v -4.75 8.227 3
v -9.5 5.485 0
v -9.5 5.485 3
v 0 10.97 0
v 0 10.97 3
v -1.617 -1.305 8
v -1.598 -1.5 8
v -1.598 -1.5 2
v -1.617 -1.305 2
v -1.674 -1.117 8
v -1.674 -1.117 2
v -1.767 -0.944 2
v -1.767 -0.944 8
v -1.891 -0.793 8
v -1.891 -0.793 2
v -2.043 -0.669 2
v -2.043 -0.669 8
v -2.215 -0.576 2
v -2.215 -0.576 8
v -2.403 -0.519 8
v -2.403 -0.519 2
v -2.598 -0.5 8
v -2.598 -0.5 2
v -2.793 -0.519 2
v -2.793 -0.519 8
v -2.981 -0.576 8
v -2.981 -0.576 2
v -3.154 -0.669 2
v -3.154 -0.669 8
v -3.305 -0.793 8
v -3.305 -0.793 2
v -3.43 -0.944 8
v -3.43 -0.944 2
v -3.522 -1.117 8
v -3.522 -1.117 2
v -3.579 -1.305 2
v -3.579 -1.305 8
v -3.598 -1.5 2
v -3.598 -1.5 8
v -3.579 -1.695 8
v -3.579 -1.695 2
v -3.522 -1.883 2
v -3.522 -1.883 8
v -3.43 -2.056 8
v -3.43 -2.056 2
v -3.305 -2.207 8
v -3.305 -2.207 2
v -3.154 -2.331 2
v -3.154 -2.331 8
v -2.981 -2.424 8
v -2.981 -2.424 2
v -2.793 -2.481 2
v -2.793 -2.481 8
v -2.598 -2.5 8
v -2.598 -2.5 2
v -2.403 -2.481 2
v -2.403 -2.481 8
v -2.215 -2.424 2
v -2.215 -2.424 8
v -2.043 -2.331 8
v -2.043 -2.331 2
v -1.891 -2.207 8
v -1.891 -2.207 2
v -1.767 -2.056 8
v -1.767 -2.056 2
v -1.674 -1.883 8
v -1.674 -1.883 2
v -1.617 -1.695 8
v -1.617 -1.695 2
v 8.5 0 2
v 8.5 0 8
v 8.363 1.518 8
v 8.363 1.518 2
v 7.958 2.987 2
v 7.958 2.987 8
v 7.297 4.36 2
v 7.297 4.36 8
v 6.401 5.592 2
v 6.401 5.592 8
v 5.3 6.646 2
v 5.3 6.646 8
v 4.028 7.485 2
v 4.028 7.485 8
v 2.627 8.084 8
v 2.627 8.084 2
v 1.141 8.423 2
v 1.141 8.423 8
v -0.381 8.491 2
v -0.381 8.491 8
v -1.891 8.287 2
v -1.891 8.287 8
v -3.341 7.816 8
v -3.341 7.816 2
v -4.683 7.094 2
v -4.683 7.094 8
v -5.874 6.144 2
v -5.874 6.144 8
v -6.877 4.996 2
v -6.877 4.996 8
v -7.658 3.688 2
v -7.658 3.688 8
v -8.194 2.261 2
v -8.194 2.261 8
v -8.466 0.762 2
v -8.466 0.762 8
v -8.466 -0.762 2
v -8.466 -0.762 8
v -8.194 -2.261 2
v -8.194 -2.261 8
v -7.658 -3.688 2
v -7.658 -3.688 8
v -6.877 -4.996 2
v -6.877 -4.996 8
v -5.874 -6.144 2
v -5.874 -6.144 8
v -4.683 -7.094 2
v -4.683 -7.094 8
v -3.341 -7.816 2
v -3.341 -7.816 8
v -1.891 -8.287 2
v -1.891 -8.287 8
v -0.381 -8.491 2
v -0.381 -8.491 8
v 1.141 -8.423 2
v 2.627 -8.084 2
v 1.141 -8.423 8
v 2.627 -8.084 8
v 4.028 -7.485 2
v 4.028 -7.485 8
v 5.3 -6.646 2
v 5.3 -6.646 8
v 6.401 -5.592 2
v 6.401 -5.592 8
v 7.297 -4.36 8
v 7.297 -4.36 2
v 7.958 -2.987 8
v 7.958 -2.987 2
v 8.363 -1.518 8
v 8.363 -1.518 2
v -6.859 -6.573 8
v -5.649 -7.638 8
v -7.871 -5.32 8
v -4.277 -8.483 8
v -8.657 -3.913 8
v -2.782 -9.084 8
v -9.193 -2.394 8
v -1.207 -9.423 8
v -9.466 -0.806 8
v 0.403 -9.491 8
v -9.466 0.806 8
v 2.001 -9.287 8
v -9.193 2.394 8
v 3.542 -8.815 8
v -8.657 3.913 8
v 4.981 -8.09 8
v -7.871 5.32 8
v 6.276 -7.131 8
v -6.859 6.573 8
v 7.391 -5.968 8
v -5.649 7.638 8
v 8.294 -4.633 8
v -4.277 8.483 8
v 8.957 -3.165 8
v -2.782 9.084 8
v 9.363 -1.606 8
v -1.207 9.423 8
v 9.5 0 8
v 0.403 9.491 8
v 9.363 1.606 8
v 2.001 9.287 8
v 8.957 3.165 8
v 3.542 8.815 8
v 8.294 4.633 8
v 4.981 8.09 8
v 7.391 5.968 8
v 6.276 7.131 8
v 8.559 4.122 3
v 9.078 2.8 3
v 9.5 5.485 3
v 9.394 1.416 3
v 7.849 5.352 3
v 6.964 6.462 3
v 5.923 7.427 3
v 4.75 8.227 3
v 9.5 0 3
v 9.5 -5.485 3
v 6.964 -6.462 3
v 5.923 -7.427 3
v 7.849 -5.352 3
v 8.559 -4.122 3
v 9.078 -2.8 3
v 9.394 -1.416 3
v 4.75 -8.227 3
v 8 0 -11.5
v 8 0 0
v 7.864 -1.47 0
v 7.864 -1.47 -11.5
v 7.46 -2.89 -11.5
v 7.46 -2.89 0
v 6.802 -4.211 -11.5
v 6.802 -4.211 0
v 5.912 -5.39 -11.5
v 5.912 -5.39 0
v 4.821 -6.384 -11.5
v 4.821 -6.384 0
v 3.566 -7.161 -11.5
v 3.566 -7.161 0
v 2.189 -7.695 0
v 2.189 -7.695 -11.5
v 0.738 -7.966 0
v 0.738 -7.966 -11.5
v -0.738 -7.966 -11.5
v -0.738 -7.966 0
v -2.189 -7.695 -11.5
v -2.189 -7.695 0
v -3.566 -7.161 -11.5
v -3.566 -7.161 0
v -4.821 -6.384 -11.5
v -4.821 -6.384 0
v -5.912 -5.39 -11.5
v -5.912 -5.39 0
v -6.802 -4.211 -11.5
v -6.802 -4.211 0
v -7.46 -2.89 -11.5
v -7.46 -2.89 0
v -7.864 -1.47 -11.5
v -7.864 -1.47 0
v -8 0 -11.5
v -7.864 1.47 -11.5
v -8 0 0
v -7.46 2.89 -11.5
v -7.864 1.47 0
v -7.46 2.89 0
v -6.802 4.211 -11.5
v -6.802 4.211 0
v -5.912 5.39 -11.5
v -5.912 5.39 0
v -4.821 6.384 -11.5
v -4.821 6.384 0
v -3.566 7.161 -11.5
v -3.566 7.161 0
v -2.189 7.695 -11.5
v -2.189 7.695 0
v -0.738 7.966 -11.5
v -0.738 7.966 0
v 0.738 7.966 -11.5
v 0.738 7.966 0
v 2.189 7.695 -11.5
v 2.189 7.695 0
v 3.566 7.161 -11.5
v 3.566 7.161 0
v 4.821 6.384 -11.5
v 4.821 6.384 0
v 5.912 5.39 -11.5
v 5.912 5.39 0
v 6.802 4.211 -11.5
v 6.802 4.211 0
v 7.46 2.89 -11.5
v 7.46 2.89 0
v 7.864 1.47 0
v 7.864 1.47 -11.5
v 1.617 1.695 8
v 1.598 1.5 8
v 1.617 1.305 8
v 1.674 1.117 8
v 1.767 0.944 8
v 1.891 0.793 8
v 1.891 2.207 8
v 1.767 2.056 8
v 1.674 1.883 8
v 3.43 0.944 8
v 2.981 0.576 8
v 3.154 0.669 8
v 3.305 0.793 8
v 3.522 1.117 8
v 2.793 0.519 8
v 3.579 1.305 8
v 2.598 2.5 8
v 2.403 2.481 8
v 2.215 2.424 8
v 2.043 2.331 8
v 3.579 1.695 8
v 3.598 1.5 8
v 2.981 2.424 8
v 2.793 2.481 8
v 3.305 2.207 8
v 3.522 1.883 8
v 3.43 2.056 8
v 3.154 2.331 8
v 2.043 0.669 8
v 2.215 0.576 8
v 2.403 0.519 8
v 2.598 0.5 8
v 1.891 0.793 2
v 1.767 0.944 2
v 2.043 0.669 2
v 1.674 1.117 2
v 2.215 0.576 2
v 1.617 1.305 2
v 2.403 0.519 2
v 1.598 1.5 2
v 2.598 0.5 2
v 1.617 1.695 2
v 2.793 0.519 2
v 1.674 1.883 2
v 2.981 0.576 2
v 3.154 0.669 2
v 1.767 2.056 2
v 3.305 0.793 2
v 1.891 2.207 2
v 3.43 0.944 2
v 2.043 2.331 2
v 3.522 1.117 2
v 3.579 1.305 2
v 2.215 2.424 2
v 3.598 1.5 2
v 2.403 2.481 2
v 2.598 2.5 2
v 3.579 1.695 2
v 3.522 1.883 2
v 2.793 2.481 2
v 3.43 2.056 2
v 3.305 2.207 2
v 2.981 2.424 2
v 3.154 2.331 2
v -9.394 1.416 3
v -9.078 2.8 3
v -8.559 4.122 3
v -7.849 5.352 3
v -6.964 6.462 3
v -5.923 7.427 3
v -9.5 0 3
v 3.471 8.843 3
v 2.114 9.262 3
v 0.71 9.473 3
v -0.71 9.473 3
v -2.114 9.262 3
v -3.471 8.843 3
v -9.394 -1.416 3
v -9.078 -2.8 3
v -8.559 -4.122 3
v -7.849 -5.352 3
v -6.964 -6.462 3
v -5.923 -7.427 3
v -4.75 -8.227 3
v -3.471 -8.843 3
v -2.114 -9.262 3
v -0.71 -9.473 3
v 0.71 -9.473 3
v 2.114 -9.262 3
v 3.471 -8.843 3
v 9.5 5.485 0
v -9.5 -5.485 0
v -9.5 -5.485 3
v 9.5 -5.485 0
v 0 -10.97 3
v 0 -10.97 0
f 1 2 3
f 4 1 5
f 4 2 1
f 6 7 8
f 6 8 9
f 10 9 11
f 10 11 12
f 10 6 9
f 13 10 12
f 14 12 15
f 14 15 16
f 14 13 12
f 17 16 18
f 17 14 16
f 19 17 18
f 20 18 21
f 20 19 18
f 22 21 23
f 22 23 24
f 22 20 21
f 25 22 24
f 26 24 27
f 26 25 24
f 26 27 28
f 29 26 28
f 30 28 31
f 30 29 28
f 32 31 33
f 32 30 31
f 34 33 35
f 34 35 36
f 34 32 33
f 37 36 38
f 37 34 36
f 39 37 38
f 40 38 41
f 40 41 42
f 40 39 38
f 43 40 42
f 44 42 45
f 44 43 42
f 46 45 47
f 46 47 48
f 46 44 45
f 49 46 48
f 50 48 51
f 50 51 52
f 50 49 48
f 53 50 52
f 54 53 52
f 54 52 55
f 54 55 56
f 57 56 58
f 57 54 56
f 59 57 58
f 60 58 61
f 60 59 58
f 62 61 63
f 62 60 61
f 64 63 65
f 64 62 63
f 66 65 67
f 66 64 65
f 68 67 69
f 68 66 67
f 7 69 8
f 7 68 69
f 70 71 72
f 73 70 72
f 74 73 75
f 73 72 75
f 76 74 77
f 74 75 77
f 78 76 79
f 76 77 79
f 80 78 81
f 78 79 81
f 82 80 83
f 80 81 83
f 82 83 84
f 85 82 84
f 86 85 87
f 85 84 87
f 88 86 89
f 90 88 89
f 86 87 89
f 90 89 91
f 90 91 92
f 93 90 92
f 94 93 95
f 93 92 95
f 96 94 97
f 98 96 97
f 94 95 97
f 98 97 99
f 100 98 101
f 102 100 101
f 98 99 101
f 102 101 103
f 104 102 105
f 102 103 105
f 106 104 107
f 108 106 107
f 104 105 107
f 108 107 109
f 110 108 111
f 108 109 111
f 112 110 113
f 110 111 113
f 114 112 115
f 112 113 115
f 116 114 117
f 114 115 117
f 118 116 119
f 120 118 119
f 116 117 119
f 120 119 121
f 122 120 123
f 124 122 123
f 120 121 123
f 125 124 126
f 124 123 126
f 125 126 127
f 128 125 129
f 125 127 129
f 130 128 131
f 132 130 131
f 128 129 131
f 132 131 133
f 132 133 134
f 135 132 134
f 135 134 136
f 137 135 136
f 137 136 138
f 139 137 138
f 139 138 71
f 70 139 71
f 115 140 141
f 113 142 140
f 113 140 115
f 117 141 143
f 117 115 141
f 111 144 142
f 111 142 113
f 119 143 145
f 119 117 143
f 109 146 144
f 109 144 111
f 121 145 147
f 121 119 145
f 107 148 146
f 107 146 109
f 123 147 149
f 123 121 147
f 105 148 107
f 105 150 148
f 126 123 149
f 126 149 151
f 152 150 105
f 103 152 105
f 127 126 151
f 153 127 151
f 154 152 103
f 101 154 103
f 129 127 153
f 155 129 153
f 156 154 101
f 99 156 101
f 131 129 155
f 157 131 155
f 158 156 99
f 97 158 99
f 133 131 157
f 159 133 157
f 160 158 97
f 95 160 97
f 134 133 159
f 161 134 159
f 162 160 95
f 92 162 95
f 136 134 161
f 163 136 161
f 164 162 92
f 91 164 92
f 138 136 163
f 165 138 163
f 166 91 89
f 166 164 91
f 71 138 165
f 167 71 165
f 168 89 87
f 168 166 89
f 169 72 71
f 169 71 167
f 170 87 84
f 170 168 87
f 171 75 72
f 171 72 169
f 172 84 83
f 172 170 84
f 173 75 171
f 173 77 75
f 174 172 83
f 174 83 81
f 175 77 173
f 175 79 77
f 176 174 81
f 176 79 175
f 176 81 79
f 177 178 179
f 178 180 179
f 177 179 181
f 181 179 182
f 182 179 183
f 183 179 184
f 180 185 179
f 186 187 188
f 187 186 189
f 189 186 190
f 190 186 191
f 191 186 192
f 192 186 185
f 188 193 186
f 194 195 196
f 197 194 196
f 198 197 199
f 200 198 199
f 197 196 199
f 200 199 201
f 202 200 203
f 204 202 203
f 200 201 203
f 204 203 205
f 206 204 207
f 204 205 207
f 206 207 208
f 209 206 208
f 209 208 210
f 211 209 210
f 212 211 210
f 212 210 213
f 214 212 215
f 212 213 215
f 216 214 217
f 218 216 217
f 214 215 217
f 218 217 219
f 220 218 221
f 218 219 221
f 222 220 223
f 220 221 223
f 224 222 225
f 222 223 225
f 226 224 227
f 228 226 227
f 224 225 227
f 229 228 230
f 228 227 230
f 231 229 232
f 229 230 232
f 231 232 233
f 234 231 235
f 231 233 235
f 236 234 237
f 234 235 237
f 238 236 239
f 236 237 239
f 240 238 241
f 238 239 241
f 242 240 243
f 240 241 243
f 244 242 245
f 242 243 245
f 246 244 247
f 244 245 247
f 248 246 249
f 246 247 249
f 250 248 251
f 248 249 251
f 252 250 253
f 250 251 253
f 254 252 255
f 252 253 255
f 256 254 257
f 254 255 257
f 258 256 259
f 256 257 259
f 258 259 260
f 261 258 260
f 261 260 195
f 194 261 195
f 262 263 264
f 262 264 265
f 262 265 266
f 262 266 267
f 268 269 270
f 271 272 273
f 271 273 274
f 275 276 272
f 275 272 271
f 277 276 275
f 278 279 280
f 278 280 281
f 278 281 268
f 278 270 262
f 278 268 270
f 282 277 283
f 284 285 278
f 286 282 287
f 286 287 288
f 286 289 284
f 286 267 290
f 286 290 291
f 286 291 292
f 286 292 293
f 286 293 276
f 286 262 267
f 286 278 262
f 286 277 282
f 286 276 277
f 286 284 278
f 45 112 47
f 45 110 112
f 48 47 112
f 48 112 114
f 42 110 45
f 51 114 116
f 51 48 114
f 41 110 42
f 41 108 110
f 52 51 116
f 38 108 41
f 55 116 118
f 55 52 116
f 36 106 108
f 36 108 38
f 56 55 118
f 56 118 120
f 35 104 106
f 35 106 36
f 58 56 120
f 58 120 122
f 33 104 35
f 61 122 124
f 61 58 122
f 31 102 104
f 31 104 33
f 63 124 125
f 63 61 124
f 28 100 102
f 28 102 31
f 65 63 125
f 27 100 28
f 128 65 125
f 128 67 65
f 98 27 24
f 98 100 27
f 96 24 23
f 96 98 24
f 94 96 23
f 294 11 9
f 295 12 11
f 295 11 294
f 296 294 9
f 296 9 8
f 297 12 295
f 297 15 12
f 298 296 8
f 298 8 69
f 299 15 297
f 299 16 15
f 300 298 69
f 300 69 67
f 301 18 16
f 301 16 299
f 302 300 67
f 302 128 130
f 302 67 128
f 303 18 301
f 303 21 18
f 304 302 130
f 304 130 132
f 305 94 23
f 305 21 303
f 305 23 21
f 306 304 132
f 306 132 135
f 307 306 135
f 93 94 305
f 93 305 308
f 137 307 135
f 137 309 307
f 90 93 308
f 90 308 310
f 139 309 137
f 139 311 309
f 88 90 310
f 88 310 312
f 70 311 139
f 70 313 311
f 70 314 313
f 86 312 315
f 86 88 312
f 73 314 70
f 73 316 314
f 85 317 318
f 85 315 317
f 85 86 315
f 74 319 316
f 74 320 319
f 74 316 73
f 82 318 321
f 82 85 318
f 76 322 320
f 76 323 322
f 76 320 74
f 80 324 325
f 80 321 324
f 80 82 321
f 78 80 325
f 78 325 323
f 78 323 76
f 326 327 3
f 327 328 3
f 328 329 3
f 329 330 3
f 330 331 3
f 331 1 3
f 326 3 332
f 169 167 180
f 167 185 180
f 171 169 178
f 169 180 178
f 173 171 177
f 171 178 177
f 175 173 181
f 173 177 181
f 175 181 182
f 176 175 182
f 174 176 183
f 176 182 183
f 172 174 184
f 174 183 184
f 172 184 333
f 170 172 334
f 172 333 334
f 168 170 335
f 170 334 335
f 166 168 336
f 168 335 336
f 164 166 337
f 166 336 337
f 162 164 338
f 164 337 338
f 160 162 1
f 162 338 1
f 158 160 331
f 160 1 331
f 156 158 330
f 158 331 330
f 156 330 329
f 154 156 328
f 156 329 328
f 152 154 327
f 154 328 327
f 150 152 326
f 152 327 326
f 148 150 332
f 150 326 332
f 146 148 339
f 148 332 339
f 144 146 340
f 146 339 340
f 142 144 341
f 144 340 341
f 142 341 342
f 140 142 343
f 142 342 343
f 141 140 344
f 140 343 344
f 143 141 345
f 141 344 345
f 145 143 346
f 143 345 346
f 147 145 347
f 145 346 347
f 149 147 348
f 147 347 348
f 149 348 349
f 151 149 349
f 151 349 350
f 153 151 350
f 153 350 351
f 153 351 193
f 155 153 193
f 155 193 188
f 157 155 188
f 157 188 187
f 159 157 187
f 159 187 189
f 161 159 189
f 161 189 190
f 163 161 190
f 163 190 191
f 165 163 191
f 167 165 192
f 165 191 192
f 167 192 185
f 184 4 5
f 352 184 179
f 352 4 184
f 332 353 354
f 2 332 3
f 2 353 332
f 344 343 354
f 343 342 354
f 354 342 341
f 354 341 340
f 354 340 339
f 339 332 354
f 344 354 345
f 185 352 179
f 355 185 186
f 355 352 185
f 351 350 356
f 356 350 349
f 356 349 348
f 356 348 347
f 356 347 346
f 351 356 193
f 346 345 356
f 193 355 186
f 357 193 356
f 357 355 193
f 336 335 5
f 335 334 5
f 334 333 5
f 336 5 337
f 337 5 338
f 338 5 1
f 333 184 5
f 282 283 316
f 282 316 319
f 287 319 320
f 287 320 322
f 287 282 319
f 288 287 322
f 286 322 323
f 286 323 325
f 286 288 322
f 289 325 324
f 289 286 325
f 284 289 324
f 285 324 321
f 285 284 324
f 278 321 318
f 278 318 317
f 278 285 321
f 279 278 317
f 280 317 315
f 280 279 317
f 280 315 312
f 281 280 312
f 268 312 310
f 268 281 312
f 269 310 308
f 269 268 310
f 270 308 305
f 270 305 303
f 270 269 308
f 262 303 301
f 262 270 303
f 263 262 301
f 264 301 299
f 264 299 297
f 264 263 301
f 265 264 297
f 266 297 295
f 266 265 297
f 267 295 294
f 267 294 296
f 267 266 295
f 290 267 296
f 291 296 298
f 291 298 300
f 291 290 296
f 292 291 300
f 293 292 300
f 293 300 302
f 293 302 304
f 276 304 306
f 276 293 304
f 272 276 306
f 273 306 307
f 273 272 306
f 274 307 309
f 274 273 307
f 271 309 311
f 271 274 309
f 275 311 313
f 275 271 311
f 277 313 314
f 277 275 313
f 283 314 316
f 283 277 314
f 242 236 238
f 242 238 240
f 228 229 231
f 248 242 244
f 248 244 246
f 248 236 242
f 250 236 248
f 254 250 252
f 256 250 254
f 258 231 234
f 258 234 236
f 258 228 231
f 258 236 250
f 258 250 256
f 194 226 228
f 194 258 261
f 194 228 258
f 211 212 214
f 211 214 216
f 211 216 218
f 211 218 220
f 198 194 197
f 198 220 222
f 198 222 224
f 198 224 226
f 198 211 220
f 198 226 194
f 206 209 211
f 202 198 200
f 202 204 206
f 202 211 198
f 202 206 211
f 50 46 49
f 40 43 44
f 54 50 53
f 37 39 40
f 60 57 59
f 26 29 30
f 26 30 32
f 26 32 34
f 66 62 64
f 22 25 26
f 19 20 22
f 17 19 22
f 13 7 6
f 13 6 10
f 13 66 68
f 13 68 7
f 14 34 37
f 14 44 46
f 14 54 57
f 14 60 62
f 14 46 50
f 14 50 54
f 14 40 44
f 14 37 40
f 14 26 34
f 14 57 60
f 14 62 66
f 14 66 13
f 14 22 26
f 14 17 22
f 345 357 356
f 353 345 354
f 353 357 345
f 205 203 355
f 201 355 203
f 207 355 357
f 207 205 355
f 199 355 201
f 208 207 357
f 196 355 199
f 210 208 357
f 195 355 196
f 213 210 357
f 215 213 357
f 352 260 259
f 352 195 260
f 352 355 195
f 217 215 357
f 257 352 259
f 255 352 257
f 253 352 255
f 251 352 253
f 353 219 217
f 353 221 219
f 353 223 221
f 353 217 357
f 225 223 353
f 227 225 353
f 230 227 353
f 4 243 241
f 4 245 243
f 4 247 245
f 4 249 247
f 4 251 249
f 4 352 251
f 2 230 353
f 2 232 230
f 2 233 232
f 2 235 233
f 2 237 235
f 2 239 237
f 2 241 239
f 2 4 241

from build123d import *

# Parameters (mm, degrees)
SKETCH_1_R          = 9.5
EXTRUDE_1_DEPTH     = 5
SKETCH_2_R          = 8
EXTRUDE_2_DEPTH     = 11.5
EXTRUDE_3_DEPTH     = 3
SKETCH_4_R          = 9.5
EXTRUDE_4_DEPTH     = 3
SKETCH_5_R          = 8.5
SKETCH_5_R_2        = 1
CUT_EXTRUDE_2_DEPTH = 6


with BuildPart() as part:
    # 草图1 → 凸台-拉伸1 (new body)
    with BuildSketch(Plane.XY):
        Circle(SKETCH_1_R)
    extrude(amount=EXTRUDE_1_DEPTH)

    # 草图2 → 凸台-拉伸2 (add)
    with BuildSketch(Plane(origin=(0, 0, 0), x_dir=(-1, 0, 0), z_dir=(0, 0, -1))):
        with Locations(Location((0, 0, 0), (0, 0, 180))):
            Circle(SKETCH_2_R)
    extrude(amount=EXTRUDE_2_DEPTH)

    # 草图3 → 凸台-拉伸3 (add)
    with BuildSketch(Plane(origin=(0, 0, 0), x_dir=(-1, 0, 0), z_dir=(0, 0, -1))):
        Polygon((0, 10.969655115), (-9.5, 5.484827557), (-9.5, -5.484827557), (0, -10.969655115), (9.5, -5.484827557), (9.5, 5.484827557), align=None)
    extrude(amount=-EXTRUDE_3_DEPTH)

    # 草图4 → 凸台-拉伸4 (add)
    with BuildSketch(Plane.XY.offset(5)):
        Circle(SKETCH_4_R)
    extrude(amount=EXTRUDE_4_DEPTH)

    # 草图5 → 切除-拉伸2 (cut)
    with BuildSketch(Plane.XY.offset(8)):
        Circle(SKETCH_5_R)
        with Locations((2.598076211, 1.5)):
            Circle(SKETCH_5_R_2, mode=Mode.SUBTRACT)
        with Locations((-2.598076211, -1.5)):
            Circle(SKETCH_5_R_2, mode=Mode.SUBTRACT)
    extrude(amount=-CUT_EXTRUDE_2_DEPTH, mode=Mode.SUBTRACT)


solid = part.part
